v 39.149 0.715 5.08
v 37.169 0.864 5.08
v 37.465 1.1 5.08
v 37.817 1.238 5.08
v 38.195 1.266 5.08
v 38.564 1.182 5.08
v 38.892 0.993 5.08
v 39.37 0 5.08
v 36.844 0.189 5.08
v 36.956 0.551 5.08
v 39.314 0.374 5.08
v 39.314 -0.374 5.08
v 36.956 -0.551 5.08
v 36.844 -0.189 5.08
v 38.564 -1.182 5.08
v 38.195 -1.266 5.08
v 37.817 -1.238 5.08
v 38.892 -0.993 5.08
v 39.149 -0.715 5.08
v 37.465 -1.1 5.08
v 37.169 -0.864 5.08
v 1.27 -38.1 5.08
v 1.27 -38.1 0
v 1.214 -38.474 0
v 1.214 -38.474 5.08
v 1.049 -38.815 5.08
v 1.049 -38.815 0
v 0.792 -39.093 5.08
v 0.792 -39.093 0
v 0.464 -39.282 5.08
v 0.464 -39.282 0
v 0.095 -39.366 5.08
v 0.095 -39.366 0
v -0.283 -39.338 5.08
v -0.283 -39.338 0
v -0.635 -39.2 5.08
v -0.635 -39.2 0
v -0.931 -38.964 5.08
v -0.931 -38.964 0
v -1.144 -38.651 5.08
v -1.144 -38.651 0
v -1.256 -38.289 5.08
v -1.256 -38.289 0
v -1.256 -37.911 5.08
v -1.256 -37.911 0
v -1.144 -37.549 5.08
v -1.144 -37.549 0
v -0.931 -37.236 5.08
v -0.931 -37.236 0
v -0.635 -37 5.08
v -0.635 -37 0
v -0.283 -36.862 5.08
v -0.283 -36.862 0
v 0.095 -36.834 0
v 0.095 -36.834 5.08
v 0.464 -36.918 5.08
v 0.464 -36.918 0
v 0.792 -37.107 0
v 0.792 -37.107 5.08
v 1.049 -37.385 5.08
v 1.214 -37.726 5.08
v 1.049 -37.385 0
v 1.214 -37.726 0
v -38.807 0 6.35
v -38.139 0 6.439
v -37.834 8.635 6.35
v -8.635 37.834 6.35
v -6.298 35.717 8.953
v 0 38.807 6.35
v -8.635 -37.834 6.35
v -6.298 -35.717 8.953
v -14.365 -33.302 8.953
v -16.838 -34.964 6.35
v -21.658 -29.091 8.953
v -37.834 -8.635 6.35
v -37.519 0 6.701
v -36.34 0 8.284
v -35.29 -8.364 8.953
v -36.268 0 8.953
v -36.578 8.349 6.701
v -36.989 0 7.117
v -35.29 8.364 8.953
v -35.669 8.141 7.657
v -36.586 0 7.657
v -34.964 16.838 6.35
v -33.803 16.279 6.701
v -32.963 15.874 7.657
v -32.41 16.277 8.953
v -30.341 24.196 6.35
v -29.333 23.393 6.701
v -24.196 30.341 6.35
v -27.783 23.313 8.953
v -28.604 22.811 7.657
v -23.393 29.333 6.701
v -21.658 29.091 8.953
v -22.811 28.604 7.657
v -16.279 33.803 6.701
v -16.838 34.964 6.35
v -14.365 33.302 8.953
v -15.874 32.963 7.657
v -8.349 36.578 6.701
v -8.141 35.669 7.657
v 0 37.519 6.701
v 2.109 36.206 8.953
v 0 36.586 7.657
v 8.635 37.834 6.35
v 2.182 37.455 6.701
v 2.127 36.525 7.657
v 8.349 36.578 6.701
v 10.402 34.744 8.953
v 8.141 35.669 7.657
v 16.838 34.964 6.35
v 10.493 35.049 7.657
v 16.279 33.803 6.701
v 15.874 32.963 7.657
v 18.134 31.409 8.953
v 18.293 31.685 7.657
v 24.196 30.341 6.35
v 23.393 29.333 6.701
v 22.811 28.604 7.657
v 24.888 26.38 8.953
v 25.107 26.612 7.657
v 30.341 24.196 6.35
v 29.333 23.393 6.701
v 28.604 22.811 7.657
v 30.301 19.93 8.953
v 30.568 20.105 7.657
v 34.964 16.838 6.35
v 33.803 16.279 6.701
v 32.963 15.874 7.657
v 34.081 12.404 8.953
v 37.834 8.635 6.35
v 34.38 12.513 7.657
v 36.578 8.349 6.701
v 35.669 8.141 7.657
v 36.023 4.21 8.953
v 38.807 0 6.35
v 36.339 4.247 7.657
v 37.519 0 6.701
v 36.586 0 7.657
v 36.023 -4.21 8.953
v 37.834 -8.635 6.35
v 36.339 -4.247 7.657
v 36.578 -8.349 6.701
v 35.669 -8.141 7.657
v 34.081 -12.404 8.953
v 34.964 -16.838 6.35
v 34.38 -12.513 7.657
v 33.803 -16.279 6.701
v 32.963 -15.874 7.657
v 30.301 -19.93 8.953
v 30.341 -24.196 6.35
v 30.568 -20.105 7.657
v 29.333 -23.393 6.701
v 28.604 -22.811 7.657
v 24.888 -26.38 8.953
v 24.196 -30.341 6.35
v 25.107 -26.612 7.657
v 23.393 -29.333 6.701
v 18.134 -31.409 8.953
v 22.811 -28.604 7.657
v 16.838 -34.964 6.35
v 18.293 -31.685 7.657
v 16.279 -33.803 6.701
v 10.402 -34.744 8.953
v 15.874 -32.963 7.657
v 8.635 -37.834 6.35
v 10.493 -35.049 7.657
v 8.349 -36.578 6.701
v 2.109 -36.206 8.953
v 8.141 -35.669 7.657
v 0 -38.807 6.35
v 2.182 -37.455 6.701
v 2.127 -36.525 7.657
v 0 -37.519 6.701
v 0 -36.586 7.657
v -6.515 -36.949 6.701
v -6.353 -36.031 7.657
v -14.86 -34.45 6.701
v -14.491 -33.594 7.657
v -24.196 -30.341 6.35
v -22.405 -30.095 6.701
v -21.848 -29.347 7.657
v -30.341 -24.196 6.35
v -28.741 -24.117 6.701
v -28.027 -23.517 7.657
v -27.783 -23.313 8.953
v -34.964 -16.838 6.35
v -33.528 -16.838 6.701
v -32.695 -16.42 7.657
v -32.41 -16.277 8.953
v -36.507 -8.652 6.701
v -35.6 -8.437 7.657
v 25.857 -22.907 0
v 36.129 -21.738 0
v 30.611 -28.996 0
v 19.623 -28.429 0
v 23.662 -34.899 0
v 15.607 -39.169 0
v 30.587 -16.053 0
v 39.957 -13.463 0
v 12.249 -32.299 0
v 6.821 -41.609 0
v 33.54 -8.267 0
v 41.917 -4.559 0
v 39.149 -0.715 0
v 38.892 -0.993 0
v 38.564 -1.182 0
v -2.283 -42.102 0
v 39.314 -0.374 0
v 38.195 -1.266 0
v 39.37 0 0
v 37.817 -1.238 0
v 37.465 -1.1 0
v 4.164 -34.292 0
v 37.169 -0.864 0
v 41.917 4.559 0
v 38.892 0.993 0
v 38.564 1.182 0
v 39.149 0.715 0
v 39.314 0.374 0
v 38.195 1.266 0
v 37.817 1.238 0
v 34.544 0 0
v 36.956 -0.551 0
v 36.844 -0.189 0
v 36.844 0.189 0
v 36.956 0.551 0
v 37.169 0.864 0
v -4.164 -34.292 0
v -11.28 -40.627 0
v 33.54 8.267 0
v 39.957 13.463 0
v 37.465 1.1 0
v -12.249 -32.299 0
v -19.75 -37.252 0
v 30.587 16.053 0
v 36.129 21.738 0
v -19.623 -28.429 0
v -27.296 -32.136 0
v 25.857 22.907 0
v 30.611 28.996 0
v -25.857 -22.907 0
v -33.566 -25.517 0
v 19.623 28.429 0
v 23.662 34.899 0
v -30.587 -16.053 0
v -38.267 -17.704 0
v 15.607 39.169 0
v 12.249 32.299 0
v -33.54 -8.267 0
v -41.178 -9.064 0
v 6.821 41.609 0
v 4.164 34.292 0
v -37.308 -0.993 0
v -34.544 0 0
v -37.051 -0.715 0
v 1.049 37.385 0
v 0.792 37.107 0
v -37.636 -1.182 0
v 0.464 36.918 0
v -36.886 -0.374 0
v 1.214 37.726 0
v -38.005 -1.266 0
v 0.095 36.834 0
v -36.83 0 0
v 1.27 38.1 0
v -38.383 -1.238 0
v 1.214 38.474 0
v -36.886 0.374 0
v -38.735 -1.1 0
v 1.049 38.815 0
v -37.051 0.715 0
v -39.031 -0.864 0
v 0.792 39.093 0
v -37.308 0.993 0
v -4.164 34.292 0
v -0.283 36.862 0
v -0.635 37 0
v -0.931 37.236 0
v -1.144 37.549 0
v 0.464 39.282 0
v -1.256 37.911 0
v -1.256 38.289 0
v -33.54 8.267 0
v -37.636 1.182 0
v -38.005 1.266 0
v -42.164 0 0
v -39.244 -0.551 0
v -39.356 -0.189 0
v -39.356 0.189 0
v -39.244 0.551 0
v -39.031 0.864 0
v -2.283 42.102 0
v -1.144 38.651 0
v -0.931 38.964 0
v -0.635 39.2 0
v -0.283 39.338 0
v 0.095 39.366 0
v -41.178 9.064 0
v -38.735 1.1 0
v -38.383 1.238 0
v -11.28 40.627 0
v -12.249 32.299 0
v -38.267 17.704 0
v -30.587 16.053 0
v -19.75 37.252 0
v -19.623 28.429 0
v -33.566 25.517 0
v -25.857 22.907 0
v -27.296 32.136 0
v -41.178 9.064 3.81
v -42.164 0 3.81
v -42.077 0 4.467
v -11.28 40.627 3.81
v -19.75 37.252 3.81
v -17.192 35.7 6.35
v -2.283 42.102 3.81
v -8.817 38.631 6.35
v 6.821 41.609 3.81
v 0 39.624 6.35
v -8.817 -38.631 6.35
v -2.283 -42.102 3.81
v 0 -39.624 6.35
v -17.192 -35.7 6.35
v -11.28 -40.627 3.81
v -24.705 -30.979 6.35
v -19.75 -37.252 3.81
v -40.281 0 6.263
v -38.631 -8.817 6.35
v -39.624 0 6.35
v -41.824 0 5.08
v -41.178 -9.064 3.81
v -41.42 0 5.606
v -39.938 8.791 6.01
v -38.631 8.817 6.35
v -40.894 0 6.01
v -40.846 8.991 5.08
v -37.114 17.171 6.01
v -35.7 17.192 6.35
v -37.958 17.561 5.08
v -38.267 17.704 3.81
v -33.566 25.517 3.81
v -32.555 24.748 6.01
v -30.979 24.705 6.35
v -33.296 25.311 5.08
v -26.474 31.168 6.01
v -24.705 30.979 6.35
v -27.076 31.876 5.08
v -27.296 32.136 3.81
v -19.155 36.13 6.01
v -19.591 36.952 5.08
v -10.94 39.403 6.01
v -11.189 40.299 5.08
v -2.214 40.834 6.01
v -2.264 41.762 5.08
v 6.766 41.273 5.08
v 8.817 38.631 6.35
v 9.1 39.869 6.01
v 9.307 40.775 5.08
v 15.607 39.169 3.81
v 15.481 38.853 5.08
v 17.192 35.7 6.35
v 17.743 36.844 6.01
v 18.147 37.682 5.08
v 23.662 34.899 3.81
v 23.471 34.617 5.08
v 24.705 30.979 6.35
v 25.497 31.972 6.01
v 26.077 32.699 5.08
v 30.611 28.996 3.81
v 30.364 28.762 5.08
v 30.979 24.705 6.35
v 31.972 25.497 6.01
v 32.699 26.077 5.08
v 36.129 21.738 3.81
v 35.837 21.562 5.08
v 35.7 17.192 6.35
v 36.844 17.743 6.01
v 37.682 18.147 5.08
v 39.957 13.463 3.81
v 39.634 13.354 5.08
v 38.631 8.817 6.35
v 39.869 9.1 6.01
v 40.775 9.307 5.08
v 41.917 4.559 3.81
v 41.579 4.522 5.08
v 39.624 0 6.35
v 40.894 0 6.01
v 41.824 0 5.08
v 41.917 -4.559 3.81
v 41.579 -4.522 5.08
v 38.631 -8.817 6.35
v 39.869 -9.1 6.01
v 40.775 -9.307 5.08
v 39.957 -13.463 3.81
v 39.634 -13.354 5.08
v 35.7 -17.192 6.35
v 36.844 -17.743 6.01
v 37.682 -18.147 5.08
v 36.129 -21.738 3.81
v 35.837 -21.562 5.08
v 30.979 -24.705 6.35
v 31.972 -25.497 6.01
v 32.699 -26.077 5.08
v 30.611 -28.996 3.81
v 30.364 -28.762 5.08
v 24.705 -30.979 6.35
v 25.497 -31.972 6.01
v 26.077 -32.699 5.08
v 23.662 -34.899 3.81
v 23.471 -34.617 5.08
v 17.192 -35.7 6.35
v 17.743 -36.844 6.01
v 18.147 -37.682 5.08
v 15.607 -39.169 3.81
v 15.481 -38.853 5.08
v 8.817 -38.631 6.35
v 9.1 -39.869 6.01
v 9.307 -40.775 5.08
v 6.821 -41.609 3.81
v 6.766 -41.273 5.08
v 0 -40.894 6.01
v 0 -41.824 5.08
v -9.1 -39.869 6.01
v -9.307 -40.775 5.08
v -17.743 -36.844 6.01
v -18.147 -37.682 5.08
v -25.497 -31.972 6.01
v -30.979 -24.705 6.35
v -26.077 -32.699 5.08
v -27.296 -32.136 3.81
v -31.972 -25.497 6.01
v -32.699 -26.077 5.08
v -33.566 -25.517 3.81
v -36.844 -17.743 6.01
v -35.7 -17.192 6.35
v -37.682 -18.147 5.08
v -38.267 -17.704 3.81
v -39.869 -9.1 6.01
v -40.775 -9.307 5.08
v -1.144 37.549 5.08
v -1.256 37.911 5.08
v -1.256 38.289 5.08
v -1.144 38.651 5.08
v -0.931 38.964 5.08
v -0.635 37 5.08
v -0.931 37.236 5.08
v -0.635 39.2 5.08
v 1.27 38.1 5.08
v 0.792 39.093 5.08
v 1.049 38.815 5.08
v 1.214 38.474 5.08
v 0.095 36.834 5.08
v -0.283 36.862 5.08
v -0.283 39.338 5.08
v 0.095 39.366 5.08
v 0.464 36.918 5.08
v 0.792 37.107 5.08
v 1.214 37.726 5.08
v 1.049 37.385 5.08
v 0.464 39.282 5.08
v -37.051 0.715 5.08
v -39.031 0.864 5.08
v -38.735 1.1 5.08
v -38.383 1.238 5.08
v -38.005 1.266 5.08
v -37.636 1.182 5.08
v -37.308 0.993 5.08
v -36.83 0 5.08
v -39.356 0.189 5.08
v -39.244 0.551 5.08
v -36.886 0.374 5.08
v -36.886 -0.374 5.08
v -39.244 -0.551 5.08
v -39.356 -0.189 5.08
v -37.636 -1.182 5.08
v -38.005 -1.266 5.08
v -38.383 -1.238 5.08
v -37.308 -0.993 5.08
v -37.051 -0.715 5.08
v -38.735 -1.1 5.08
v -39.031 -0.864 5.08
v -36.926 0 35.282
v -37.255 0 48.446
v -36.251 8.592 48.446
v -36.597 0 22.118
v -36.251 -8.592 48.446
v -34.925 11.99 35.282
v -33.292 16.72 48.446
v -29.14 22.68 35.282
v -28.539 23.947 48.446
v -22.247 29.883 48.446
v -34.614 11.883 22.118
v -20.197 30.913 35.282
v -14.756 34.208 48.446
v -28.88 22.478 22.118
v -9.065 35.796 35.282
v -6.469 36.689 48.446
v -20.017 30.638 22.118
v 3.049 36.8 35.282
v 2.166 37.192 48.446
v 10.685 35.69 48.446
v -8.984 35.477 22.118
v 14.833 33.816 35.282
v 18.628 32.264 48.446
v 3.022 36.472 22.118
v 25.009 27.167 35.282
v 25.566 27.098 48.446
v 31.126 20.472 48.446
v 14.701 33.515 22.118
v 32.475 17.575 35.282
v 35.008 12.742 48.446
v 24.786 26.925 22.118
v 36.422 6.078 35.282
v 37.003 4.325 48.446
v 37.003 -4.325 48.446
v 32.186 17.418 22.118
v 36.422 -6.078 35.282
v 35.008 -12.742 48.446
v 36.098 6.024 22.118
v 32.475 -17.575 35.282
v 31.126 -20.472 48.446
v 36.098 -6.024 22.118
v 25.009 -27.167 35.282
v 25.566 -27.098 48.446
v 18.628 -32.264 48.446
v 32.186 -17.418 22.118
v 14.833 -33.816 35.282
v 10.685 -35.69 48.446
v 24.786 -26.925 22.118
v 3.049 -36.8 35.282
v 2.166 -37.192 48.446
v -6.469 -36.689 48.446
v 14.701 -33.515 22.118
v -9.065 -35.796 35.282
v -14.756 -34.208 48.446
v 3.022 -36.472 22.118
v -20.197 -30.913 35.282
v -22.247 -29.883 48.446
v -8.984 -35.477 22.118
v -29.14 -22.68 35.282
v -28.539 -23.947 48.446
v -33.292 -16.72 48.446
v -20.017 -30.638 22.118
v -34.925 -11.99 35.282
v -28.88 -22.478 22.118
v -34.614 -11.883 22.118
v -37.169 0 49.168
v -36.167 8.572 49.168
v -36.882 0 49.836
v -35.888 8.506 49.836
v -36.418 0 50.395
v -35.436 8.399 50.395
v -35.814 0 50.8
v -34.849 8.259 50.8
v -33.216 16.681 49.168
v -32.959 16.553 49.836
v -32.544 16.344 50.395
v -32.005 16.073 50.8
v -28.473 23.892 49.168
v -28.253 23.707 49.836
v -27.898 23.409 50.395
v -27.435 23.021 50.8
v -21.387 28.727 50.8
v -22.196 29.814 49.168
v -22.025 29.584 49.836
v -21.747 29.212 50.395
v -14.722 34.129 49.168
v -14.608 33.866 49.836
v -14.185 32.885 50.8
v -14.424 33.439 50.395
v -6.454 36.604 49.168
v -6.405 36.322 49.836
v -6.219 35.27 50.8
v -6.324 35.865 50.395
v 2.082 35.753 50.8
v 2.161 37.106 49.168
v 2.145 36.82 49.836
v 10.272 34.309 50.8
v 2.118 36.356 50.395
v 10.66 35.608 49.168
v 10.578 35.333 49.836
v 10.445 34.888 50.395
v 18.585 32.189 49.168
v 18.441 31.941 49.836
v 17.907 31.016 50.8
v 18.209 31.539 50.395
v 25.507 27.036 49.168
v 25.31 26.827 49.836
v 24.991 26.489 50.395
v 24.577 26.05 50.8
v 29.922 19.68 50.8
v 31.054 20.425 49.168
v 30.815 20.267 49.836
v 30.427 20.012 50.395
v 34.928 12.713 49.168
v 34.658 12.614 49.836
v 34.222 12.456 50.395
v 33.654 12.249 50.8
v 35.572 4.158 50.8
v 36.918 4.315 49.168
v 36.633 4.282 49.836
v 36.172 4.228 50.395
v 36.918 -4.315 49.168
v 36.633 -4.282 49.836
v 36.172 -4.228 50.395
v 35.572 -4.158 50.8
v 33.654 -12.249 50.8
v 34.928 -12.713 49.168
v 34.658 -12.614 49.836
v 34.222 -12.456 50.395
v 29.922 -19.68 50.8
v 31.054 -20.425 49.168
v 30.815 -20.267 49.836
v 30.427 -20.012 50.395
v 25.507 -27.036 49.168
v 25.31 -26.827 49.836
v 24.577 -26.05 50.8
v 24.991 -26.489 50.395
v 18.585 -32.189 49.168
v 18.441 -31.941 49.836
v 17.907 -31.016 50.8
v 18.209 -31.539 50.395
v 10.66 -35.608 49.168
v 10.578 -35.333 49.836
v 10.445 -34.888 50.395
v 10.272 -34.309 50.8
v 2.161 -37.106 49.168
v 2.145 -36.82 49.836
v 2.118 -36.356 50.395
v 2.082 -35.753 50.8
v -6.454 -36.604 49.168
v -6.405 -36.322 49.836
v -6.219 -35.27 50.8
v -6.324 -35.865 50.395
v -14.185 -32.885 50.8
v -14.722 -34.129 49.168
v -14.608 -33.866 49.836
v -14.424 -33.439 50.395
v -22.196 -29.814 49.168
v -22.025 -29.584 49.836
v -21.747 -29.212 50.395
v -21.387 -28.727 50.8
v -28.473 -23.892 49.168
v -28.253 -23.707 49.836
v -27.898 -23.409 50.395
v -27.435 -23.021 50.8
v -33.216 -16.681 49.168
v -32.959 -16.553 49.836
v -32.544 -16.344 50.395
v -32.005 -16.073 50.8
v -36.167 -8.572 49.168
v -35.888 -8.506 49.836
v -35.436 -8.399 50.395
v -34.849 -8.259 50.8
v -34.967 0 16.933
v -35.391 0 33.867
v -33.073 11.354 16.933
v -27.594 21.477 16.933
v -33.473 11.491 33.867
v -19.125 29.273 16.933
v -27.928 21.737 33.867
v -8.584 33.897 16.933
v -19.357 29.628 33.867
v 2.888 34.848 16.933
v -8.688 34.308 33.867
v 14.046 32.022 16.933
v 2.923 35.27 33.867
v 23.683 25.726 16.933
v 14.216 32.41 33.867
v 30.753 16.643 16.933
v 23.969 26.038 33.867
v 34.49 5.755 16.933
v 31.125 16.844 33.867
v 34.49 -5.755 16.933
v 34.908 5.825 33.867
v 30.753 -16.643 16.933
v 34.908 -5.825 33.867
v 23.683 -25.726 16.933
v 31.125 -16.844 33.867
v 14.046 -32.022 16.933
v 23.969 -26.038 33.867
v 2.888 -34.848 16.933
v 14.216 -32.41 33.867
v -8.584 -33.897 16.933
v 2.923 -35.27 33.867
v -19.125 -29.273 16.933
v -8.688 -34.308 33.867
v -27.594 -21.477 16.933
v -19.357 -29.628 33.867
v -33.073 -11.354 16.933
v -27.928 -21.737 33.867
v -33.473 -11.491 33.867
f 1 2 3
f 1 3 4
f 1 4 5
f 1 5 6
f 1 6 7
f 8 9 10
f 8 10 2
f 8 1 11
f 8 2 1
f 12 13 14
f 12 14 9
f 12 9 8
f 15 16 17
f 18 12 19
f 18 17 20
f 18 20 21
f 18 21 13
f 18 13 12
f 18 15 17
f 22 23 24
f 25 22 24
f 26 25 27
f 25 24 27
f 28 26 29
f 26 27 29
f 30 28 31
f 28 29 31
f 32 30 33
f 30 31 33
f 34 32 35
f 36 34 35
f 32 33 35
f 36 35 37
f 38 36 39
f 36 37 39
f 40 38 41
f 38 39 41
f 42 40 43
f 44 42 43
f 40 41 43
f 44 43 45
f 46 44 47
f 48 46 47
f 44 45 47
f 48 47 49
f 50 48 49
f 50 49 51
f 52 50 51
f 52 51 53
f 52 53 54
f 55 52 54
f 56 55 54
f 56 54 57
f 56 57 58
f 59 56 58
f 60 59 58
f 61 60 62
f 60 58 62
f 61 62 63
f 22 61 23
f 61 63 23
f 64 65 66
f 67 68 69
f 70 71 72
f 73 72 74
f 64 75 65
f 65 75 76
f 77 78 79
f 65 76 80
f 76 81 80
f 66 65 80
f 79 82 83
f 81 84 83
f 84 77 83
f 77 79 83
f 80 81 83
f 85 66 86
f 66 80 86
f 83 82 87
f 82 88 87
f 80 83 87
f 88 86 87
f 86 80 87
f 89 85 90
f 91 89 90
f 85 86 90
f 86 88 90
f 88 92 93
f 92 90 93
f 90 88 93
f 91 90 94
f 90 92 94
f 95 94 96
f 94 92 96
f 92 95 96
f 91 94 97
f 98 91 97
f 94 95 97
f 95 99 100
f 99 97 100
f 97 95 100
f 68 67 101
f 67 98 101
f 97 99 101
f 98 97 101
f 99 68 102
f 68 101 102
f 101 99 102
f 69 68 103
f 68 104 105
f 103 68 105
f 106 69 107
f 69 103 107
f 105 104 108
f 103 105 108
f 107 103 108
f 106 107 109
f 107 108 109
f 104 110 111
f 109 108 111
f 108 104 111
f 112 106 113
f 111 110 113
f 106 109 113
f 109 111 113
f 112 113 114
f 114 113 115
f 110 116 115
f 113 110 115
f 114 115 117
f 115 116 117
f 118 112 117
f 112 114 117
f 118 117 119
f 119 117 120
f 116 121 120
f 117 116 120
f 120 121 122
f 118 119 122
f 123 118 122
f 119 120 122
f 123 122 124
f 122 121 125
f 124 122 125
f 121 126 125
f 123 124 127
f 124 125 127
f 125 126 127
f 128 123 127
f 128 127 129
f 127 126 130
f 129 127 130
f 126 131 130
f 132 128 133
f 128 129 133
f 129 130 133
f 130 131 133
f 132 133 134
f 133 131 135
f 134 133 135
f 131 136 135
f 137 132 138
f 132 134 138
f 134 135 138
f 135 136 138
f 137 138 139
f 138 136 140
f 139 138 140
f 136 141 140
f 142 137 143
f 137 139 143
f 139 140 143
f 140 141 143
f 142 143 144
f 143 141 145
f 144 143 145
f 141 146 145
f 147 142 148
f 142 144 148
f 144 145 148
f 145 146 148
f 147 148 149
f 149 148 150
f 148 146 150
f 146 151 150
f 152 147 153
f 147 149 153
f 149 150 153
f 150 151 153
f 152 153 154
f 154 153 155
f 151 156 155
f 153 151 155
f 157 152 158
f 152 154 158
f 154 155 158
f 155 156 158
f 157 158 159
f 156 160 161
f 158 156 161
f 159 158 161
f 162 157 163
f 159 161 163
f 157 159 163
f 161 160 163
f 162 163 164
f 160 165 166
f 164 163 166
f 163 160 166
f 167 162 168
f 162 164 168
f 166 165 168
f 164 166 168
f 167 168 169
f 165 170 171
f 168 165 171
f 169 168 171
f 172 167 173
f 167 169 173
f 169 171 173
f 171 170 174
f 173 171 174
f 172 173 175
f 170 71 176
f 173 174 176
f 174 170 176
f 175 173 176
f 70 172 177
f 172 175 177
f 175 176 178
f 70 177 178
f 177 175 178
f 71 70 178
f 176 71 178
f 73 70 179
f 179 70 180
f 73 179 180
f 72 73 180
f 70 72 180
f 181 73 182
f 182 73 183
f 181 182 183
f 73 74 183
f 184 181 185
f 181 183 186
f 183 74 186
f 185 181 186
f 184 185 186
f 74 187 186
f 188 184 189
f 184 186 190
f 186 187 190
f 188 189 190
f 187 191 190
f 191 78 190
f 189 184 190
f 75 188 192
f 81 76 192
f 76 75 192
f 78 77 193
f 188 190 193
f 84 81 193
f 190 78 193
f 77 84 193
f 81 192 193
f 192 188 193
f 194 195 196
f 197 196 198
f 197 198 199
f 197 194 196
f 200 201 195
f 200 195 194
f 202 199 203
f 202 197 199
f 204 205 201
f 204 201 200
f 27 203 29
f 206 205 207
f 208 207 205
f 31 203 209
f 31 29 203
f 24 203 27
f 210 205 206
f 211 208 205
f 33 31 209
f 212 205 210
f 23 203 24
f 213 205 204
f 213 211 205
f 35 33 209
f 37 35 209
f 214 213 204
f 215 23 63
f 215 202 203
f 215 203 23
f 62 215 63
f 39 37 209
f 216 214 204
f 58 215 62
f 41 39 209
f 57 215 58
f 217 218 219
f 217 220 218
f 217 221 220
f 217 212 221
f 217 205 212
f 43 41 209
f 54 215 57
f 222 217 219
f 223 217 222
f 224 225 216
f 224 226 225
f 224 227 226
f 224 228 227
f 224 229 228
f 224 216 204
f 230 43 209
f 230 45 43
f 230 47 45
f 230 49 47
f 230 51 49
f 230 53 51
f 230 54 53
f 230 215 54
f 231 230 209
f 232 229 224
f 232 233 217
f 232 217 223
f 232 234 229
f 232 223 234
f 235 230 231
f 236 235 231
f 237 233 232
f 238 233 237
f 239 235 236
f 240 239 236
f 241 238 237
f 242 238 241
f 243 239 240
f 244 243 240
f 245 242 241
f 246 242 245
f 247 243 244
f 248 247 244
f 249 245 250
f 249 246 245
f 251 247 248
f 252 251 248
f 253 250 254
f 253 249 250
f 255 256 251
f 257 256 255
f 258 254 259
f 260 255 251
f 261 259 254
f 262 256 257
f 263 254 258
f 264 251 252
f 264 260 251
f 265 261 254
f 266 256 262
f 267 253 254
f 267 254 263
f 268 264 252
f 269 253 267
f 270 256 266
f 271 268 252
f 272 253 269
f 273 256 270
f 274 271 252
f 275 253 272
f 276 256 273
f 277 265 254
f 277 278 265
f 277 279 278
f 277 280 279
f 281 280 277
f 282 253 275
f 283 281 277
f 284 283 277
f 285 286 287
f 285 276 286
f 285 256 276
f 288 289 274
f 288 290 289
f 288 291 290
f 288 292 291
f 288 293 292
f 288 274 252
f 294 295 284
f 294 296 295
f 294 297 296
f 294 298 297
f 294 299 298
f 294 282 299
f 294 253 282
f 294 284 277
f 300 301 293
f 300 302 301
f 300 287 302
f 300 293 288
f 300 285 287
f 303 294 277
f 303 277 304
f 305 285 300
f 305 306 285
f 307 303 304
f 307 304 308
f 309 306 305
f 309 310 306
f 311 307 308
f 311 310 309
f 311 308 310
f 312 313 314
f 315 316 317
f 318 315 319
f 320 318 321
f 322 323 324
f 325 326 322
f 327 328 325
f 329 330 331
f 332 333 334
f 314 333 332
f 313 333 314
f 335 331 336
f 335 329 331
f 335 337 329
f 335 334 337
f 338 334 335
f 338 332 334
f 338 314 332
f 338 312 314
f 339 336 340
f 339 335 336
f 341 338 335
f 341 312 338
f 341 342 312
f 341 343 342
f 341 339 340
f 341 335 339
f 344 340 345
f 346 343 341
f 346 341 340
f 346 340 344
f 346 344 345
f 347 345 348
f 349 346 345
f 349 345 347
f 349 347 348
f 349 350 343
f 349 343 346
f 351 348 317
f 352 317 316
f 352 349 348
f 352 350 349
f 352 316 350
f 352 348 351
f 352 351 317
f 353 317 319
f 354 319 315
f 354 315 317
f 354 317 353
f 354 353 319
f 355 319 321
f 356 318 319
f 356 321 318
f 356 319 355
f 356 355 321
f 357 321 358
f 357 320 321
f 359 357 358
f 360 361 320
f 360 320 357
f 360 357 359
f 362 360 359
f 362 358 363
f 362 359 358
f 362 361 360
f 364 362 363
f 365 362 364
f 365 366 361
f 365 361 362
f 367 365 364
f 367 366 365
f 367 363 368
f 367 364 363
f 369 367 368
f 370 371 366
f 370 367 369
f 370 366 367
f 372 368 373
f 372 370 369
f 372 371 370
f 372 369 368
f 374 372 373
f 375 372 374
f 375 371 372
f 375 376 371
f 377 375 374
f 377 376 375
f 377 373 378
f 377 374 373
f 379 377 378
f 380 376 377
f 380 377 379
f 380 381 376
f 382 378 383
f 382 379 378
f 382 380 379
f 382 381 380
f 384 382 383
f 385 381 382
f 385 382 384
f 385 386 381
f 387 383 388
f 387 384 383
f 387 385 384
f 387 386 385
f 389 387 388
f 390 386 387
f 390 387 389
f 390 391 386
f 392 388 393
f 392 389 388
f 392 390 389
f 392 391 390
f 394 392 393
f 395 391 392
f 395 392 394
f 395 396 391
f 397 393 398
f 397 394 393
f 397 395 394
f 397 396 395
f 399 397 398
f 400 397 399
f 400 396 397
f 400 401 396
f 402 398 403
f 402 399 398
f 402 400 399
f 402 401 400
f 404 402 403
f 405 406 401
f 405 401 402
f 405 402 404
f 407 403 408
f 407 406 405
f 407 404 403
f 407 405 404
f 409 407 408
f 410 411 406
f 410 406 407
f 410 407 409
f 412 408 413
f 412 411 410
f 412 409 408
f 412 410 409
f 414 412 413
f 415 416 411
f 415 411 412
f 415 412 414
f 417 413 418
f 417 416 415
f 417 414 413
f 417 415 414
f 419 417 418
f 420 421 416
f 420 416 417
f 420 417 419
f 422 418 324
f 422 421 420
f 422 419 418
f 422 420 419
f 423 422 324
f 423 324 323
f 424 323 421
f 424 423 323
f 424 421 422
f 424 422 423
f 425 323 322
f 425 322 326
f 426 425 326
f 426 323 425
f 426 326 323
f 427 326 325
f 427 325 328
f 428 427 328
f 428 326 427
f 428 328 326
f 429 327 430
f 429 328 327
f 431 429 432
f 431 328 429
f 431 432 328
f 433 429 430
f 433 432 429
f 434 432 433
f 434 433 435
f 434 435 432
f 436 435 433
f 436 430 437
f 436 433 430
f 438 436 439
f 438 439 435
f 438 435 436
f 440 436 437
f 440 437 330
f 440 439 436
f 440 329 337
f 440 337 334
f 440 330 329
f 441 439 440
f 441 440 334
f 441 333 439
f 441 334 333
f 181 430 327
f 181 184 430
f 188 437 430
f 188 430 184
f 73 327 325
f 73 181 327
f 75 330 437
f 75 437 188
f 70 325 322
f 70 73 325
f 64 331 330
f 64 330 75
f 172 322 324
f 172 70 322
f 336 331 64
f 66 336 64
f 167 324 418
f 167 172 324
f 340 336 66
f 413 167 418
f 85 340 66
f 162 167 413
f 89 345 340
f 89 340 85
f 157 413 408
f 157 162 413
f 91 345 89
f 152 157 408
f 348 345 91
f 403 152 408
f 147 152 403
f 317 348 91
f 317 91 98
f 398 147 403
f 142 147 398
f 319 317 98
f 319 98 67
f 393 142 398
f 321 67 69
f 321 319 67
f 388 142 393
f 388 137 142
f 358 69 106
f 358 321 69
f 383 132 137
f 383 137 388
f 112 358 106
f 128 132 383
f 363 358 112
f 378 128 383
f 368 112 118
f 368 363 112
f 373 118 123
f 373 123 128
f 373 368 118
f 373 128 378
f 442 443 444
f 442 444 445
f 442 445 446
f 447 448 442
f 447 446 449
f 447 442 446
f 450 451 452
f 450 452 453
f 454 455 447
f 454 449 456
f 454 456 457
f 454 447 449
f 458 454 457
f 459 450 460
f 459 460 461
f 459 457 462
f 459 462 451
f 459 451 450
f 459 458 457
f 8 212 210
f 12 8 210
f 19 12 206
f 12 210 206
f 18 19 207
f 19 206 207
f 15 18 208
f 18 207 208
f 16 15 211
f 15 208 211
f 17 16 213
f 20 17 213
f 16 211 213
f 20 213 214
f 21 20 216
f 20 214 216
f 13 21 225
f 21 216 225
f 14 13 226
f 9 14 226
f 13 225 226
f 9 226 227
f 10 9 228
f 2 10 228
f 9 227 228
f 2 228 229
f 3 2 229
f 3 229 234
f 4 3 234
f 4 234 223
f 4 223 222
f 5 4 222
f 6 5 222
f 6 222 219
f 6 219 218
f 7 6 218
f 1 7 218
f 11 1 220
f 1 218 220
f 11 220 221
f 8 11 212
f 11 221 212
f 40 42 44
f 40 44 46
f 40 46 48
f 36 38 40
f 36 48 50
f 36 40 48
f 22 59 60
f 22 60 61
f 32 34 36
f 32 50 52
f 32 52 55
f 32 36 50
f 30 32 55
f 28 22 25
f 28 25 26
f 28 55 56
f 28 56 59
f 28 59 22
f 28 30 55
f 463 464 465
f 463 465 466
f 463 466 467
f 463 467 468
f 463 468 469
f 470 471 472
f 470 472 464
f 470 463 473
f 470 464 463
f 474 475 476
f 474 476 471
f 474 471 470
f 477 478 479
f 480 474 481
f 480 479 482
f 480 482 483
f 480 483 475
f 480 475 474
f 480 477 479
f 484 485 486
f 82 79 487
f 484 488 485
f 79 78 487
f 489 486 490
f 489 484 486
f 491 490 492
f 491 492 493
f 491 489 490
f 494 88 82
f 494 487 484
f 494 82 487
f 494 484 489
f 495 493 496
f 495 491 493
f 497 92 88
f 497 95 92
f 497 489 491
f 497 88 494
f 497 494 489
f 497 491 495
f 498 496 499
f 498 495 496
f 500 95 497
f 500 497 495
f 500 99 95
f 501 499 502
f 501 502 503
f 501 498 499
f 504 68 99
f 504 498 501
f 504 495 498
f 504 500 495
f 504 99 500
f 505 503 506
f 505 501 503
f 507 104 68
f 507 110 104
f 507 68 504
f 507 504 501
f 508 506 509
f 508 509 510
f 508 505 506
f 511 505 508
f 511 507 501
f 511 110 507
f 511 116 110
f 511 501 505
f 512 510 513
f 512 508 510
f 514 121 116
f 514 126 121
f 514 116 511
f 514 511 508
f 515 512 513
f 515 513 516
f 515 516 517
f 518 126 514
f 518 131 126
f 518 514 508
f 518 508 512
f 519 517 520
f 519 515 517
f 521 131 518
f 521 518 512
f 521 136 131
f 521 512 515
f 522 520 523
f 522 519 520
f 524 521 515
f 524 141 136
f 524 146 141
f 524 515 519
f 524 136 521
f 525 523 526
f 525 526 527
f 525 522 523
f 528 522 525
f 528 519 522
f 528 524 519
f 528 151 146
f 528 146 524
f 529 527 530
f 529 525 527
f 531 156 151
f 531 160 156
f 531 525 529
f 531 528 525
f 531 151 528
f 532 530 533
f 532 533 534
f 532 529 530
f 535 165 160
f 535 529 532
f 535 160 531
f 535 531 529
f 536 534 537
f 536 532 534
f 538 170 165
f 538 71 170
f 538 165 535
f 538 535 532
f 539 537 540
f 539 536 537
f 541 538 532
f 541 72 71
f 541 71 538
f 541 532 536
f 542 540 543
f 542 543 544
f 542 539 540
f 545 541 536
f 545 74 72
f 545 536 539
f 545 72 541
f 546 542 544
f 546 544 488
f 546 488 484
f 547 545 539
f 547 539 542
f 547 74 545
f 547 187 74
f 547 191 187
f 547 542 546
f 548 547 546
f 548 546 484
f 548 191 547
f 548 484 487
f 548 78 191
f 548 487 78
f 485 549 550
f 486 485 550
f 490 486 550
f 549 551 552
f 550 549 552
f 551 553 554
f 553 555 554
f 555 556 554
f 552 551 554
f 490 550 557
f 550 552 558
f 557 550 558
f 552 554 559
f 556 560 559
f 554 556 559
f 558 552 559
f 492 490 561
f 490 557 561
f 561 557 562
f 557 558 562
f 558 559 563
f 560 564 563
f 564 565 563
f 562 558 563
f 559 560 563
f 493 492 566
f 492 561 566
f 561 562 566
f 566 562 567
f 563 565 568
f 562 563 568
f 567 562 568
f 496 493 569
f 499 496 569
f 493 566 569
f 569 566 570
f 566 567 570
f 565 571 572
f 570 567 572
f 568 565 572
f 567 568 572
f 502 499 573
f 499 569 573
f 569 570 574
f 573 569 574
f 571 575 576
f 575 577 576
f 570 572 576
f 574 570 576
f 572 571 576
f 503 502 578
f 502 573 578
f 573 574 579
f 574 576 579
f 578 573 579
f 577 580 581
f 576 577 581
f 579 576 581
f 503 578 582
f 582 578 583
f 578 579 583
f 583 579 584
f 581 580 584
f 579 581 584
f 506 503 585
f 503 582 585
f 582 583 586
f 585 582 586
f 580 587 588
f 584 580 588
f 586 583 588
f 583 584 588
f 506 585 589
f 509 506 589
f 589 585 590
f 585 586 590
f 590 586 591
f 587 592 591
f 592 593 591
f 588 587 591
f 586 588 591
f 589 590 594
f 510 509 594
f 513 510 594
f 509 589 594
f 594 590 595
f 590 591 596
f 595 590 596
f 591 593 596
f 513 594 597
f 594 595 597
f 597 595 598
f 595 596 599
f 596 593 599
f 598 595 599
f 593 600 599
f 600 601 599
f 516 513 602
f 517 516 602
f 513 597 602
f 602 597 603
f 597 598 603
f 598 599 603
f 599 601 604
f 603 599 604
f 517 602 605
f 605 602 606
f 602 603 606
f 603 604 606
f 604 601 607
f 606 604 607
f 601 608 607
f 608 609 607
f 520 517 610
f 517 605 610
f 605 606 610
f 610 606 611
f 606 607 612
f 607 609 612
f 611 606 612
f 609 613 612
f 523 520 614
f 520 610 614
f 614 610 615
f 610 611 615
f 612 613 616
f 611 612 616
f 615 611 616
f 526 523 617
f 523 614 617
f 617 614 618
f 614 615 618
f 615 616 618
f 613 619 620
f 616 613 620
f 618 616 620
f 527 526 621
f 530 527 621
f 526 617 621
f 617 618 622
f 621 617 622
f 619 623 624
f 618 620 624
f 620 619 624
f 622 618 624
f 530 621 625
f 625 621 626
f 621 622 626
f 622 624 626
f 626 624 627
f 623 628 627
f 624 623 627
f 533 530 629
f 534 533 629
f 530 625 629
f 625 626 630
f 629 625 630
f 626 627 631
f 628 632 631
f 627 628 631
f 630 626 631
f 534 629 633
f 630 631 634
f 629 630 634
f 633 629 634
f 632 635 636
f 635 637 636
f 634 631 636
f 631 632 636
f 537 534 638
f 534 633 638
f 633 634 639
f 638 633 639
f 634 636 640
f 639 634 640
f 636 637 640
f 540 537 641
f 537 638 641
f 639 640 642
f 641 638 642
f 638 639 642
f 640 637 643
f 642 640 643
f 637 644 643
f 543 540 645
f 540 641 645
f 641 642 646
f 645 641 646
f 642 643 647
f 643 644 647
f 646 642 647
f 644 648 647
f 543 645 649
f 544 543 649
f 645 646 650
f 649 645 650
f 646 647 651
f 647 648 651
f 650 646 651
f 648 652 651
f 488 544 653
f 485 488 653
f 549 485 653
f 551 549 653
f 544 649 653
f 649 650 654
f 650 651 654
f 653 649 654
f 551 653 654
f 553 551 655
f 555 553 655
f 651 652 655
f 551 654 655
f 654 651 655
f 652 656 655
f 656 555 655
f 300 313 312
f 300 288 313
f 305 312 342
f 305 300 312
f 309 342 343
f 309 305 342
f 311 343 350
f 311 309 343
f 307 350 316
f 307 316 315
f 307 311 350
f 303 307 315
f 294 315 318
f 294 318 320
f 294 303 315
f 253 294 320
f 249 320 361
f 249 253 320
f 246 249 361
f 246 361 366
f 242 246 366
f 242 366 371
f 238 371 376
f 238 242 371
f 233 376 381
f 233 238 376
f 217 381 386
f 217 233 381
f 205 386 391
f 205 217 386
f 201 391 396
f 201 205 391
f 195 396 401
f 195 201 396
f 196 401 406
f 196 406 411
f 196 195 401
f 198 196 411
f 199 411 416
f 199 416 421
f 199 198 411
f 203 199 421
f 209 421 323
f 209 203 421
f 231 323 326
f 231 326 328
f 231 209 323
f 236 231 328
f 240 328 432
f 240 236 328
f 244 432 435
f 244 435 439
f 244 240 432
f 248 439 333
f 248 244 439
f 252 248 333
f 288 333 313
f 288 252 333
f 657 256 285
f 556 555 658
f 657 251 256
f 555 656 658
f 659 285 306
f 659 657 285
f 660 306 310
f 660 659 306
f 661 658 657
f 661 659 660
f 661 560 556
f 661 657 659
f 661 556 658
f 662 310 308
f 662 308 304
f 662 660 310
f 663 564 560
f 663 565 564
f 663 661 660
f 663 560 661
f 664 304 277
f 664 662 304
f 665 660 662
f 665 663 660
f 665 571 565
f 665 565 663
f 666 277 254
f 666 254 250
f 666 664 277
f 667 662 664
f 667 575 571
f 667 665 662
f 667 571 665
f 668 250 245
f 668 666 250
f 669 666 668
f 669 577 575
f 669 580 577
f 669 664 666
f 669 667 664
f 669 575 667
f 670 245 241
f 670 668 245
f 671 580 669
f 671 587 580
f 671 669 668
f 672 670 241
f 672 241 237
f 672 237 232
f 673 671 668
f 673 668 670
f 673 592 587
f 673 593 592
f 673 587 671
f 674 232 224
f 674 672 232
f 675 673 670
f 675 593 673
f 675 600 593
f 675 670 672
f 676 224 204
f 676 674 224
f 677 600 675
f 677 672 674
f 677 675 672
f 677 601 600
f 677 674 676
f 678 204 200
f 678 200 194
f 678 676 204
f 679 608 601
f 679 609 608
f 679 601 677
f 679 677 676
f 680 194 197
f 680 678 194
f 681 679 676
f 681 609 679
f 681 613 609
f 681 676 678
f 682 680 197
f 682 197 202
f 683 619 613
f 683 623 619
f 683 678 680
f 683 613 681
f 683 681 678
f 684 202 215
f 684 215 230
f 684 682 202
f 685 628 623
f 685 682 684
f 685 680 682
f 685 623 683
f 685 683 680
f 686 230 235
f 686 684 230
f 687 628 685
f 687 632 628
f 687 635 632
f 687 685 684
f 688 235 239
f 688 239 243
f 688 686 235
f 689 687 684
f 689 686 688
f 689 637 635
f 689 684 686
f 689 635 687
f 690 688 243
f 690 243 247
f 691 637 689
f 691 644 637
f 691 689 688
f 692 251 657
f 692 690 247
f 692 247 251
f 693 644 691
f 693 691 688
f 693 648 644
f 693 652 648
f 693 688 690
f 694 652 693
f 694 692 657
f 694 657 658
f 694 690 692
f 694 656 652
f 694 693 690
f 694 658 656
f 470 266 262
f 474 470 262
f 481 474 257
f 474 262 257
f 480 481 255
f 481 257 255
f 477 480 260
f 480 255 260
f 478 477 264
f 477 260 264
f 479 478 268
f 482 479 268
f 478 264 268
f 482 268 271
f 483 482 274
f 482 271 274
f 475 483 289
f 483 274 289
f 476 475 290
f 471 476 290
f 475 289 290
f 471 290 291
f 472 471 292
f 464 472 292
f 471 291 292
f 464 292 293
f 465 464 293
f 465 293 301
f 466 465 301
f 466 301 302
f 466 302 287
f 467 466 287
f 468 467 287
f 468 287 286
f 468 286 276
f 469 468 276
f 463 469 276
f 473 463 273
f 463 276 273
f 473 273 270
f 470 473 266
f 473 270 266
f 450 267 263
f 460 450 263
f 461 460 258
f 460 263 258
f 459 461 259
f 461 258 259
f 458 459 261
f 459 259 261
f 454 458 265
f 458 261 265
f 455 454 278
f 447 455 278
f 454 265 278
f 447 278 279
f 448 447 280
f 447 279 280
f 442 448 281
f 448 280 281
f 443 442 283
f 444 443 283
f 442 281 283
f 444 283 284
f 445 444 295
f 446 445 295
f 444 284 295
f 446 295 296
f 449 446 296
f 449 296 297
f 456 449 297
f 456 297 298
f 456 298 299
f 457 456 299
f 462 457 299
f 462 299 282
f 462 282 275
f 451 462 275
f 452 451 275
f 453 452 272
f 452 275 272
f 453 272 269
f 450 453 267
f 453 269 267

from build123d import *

# Parameters (mm, degrees)
F3_R     = 1.27
F4_DEPTH = 5.08


# Not quite as in the source:
# - a fillet or chamfer that OpenCascade refuses, or shapes differently, is made with other operations: its cross-section is extruded or revolved along the edge and cut away or added


with BuildPart() as f1:
    # F0 (on Front) → F1 (revolve)
    with BuildSketch(Plane.XZ):
        Polygon((-42.164, 0), (-34.544, 0), (-35.814, 50.8), (-37.314, 50.8), (-36.20275, 6.35), (-42.164, 6.35), align=None)
    revolve(axis=Axis((0, 0, 8.2894073013), (0, 0, -1)))

    # F2: fillet of radius 2.54 on 3 edges, made by hand

    # F2_s1 → F2_t2 (revolve)
    with BuildSketch(Plane.XZ):
        with BuildLine():
            ThreePointArc((-38.807043626, 6.35), (-36.9886872775, 7.1165344126), (-36.2678370041, 8.9534801655))
            Line((-36.2678370041, 8.9534801655), (-36.20275, 6.35))
            Line((-36.20275, 6.35), (-38.807043626, 6.35))
        make_face()
    revolve(axis=Axis((0, 0, 6.35), (0, 0, -1)))

    # F2_s3 → F2_t4 (revolve, cut)
    with BuildSketch(Plane.XZ):
        with BuildLine():
            ThreePointArc((-39.624, 6.35), (-41.4200512242, 5.6060512242), (-42.164, 3.81))
            Line((-42.164, 3.81), (-42.164, 6.35))
            Line((-42.164, 6.35), (-39.624, 6.35))
        make_face()
    revolve(axis=Axis((0, 0, 6.35), (0, 0, -1)), mode=Mode.SUBTRACT)

    # F2_s5 → F2_t6 (revolve, cut)
    with BuildSketch(Plane.XZ):
        with BuildLine():
            ThreePointArc((-37.2551532867, 48.4461314672), (-36.8821851711, 49.8358886527), (-35.814, 50.8))
            Line((-35.814, 50.8), (-37.314, 50.8))
            Line((-37.314, 50.8), (-37.2551532867, 48.4461314672))
        make_face()
    revolve(axis=Axis((0, 0, 50.8), (0, 0, -1)), mode=Mode.SUBTRACT)

    # F3 (on face) → F4 (cut)
    with BuildSketch(Plane(origin=(0, 0, 0), x_dir=(1, 0, 0), z_dir=(0, 0, -1))):
        with Locations((0, 38.1)):
            Circle(F3_R)
        with Locations((38.1, 0)):
            Circle(F3_R)
        with Locations((0, -38.1)):
            Circle(F3_R)
        with Locations((-38.1, 0)):
            Circle(F3_R)
    extrude(amount=-F4_DEPTH, mode=Mode.SUBTRACT)


solid = f1.part
